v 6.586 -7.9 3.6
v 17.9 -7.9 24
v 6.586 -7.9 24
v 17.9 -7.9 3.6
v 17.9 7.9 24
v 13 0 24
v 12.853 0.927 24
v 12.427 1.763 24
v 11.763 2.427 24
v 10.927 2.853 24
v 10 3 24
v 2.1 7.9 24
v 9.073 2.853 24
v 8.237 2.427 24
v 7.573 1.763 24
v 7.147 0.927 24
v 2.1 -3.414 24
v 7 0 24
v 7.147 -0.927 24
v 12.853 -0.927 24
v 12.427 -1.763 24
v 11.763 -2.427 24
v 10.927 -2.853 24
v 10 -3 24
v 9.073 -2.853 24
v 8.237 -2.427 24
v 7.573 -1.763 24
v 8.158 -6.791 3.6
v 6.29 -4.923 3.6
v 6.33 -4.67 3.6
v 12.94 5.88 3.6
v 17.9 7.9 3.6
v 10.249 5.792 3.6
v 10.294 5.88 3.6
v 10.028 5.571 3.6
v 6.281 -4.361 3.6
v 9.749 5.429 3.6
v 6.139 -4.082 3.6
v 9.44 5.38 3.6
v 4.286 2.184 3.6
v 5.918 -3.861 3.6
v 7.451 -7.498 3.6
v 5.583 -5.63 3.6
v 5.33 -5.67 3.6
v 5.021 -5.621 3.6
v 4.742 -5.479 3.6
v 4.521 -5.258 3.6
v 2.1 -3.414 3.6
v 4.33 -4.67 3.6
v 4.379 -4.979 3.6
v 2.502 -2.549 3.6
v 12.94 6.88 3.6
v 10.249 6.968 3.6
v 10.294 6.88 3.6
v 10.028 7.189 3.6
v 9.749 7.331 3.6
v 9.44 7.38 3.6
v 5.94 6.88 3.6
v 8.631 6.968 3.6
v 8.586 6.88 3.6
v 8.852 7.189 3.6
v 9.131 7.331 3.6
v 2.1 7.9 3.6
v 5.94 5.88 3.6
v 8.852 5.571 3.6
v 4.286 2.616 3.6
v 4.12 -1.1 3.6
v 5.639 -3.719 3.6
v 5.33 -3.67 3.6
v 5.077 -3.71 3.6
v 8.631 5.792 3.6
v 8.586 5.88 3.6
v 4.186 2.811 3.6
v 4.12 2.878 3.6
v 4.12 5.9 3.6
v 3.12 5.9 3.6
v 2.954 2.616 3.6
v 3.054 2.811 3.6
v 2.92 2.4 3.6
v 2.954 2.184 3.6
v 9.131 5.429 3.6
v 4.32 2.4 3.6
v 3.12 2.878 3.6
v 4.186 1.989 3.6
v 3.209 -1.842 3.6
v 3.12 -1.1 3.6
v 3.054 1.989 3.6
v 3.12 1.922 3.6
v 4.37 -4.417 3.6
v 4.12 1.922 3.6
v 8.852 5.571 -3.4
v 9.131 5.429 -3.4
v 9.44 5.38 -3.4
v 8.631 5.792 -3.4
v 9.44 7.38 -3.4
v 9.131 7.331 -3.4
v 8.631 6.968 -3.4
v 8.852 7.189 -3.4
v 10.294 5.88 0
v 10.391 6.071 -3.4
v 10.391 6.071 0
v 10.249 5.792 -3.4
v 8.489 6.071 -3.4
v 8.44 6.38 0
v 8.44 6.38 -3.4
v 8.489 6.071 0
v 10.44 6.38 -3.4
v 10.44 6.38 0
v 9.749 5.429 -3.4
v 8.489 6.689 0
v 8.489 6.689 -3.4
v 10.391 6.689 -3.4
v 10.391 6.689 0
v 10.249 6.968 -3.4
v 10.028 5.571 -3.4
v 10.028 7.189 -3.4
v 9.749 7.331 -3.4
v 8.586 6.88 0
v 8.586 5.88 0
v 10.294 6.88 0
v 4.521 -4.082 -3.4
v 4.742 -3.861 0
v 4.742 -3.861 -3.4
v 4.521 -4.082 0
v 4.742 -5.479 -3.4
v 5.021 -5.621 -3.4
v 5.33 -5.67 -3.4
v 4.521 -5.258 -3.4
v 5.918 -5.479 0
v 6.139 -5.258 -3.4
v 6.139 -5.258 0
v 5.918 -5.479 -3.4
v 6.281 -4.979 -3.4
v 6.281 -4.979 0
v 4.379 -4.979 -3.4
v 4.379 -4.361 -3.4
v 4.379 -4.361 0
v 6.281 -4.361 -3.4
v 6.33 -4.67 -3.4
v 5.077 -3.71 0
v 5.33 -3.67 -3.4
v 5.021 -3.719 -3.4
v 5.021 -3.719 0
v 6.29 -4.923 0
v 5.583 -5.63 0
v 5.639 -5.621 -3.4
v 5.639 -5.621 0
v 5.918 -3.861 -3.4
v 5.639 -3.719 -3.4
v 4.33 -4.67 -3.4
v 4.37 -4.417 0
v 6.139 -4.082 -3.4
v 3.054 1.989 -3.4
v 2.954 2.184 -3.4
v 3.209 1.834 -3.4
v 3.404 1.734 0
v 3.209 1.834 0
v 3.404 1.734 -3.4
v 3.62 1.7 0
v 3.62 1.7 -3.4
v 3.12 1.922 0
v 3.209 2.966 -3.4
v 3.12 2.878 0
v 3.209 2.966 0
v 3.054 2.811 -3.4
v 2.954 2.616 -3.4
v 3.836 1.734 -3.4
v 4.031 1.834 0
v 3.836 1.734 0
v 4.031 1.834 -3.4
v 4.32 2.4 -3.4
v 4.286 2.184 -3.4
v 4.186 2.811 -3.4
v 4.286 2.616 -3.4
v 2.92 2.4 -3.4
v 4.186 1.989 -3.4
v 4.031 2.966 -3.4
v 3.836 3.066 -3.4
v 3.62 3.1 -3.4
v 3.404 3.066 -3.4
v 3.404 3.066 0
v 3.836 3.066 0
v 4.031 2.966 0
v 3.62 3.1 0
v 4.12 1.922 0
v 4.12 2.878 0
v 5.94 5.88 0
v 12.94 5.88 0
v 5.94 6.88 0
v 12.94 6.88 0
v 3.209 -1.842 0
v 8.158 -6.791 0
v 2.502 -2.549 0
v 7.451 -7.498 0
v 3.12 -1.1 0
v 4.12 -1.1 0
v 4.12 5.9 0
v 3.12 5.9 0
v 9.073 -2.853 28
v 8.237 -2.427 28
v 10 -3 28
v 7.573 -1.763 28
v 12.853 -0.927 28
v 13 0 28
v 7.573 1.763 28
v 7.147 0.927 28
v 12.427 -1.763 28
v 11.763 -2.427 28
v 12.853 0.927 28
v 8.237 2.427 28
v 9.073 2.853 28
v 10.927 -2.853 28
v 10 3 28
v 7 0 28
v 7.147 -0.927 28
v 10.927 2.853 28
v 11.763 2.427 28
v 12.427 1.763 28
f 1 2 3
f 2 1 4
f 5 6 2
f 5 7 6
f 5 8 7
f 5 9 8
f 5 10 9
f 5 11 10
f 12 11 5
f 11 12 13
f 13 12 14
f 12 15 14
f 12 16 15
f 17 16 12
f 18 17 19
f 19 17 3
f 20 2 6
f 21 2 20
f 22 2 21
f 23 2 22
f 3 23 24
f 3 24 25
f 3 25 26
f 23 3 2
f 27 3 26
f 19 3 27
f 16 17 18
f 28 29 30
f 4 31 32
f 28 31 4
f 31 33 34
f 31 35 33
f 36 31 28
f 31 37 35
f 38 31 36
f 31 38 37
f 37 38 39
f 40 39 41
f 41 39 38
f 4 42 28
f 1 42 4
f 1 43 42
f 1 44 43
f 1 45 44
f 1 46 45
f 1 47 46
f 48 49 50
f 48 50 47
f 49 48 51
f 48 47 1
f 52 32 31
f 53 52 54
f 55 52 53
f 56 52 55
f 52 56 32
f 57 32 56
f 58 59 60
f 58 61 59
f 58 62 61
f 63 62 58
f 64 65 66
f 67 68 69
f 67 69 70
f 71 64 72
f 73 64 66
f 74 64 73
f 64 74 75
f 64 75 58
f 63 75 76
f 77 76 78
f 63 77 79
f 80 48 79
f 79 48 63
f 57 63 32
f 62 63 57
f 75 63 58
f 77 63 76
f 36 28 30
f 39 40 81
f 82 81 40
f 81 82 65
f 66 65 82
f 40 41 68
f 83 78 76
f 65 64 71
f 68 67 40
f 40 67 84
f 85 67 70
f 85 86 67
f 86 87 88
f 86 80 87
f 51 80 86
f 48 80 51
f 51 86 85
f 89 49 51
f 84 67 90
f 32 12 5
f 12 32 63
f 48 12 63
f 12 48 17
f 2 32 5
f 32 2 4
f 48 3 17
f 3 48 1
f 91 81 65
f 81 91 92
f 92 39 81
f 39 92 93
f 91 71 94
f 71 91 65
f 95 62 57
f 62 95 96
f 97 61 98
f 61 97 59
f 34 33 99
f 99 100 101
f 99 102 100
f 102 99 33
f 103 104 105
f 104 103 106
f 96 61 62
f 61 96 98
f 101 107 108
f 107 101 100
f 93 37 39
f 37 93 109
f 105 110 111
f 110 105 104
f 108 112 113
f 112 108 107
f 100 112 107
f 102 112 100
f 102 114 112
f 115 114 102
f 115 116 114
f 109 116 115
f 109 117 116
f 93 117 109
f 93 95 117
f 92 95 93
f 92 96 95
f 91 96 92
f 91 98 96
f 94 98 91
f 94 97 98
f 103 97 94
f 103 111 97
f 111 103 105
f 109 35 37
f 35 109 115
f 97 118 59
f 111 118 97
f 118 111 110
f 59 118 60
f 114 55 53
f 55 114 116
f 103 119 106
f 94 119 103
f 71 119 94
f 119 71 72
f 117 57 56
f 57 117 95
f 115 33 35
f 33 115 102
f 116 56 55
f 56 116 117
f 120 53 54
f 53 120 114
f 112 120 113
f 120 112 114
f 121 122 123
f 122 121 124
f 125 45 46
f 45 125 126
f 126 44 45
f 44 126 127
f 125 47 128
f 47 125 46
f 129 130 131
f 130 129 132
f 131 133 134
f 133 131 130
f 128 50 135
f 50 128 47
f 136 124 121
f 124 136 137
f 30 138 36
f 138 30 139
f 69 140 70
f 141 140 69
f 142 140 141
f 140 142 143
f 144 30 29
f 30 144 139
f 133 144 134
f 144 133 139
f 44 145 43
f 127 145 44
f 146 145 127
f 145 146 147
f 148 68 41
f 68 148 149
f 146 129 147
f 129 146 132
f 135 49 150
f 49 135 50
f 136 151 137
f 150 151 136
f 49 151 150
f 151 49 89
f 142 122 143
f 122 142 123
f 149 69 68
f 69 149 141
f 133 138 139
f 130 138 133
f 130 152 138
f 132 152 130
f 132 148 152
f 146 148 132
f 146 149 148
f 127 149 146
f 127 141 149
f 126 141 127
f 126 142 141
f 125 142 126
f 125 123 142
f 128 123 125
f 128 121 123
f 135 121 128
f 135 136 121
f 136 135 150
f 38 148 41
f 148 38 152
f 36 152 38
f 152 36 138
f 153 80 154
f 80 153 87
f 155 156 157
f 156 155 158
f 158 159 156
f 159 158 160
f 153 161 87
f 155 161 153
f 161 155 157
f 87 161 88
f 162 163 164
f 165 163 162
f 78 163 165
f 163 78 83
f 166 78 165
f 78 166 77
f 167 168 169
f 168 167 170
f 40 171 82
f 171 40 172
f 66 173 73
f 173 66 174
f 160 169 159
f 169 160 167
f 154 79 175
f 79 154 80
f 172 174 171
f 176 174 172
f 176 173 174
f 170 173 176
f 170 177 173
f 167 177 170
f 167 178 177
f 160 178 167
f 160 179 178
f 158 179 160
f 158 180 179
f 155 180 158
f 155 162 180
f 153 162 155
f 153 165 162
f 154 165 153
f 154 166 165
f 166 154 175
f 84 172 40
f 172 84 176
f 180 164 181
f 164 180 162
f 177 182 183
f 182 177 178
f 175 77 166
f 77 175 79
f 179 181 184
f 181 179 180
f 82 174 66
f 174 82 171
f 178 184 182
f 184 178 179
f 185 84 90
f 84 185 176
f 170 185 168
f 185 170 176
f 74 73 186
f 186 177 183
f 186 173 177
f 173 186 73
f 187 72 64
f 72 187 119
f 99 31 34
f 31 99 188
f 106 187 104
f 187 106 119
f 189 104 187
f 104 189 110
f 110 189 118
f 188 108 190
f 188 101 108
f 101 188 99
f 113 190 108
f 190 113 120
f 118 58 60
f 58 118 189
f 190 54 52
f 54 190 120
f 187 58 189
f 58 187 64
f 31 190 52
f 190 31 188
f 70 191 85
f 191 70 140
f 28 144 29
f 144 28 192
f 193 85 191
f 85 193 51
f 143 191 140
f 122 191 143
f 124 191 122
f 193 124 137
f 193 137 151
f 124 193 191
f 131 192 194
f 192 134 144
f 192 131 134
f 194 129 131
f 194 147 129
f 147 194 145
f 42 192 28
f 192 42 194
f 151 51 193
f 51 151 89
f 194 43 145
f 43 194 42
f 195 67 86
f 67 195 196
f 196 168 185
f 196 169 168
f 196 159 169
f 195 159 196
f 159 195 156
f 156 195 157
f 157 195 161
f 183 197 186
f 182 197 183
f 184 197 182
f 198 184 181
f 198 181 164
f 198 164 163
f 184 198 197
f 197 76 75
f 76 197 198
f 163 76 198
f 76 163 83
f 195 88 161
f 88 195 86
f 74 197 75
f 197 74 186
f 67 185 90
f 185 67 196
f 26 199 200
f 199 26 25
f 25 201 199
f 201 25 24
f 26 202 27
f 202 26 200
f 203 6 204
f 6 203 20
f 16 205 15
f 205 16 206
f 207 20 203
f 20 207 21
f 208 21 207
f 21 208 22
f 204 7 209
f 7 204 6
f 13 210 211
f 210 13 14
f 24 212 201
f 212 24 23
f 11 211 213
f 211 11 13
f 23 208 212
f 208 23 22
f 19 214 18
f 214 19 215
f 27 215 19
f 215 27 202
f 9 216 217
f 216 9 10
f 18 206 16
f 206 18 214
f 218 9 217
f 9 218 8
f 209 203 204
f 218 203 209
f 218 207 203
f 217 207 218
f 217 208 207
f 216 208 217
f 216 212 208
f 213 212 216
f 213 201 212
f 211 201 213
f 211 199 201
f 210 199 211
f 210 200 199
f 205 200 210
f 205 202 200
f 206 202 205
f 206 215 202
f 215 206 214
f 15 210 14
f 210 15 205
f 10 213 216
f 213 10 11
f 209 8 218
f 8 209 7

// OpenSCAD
$fn = 20;

fh = 3.4;
fh2 = 3.6;

h = 24;

hj = 4;

translate([10,0,0])
mirror([1,1,0]) {

difference(){
translate([-7.9,-7.9,fh2])cube([15.8,15.8,h-fh2]);
rotate([0,0,45]) translate([8,-5,0])cube([20,20,30]);

}


translate([-6.38,0.56,-fh]) cylinder(fh+fh2,1,1);
translate([4.67,4.67,-fh]) cylinder(fh+fh2,1,1);
translate([-2.4,6.38,-fh]) cylinder(fh+fh2,0.7,0.7);

translate([-6.38,0.56,fh2/2]) cube([1,7,fh2],center=true);
translate([4.67,4.67,fh2/2]) rotate([0,0,45])cube([1,7,fh2],center=true);
translate([-2.4,6.38,fh2/2]) cube([7,1,fh2],center=true);




translate([0,0,h])cylinder(hj,3,3);

}
